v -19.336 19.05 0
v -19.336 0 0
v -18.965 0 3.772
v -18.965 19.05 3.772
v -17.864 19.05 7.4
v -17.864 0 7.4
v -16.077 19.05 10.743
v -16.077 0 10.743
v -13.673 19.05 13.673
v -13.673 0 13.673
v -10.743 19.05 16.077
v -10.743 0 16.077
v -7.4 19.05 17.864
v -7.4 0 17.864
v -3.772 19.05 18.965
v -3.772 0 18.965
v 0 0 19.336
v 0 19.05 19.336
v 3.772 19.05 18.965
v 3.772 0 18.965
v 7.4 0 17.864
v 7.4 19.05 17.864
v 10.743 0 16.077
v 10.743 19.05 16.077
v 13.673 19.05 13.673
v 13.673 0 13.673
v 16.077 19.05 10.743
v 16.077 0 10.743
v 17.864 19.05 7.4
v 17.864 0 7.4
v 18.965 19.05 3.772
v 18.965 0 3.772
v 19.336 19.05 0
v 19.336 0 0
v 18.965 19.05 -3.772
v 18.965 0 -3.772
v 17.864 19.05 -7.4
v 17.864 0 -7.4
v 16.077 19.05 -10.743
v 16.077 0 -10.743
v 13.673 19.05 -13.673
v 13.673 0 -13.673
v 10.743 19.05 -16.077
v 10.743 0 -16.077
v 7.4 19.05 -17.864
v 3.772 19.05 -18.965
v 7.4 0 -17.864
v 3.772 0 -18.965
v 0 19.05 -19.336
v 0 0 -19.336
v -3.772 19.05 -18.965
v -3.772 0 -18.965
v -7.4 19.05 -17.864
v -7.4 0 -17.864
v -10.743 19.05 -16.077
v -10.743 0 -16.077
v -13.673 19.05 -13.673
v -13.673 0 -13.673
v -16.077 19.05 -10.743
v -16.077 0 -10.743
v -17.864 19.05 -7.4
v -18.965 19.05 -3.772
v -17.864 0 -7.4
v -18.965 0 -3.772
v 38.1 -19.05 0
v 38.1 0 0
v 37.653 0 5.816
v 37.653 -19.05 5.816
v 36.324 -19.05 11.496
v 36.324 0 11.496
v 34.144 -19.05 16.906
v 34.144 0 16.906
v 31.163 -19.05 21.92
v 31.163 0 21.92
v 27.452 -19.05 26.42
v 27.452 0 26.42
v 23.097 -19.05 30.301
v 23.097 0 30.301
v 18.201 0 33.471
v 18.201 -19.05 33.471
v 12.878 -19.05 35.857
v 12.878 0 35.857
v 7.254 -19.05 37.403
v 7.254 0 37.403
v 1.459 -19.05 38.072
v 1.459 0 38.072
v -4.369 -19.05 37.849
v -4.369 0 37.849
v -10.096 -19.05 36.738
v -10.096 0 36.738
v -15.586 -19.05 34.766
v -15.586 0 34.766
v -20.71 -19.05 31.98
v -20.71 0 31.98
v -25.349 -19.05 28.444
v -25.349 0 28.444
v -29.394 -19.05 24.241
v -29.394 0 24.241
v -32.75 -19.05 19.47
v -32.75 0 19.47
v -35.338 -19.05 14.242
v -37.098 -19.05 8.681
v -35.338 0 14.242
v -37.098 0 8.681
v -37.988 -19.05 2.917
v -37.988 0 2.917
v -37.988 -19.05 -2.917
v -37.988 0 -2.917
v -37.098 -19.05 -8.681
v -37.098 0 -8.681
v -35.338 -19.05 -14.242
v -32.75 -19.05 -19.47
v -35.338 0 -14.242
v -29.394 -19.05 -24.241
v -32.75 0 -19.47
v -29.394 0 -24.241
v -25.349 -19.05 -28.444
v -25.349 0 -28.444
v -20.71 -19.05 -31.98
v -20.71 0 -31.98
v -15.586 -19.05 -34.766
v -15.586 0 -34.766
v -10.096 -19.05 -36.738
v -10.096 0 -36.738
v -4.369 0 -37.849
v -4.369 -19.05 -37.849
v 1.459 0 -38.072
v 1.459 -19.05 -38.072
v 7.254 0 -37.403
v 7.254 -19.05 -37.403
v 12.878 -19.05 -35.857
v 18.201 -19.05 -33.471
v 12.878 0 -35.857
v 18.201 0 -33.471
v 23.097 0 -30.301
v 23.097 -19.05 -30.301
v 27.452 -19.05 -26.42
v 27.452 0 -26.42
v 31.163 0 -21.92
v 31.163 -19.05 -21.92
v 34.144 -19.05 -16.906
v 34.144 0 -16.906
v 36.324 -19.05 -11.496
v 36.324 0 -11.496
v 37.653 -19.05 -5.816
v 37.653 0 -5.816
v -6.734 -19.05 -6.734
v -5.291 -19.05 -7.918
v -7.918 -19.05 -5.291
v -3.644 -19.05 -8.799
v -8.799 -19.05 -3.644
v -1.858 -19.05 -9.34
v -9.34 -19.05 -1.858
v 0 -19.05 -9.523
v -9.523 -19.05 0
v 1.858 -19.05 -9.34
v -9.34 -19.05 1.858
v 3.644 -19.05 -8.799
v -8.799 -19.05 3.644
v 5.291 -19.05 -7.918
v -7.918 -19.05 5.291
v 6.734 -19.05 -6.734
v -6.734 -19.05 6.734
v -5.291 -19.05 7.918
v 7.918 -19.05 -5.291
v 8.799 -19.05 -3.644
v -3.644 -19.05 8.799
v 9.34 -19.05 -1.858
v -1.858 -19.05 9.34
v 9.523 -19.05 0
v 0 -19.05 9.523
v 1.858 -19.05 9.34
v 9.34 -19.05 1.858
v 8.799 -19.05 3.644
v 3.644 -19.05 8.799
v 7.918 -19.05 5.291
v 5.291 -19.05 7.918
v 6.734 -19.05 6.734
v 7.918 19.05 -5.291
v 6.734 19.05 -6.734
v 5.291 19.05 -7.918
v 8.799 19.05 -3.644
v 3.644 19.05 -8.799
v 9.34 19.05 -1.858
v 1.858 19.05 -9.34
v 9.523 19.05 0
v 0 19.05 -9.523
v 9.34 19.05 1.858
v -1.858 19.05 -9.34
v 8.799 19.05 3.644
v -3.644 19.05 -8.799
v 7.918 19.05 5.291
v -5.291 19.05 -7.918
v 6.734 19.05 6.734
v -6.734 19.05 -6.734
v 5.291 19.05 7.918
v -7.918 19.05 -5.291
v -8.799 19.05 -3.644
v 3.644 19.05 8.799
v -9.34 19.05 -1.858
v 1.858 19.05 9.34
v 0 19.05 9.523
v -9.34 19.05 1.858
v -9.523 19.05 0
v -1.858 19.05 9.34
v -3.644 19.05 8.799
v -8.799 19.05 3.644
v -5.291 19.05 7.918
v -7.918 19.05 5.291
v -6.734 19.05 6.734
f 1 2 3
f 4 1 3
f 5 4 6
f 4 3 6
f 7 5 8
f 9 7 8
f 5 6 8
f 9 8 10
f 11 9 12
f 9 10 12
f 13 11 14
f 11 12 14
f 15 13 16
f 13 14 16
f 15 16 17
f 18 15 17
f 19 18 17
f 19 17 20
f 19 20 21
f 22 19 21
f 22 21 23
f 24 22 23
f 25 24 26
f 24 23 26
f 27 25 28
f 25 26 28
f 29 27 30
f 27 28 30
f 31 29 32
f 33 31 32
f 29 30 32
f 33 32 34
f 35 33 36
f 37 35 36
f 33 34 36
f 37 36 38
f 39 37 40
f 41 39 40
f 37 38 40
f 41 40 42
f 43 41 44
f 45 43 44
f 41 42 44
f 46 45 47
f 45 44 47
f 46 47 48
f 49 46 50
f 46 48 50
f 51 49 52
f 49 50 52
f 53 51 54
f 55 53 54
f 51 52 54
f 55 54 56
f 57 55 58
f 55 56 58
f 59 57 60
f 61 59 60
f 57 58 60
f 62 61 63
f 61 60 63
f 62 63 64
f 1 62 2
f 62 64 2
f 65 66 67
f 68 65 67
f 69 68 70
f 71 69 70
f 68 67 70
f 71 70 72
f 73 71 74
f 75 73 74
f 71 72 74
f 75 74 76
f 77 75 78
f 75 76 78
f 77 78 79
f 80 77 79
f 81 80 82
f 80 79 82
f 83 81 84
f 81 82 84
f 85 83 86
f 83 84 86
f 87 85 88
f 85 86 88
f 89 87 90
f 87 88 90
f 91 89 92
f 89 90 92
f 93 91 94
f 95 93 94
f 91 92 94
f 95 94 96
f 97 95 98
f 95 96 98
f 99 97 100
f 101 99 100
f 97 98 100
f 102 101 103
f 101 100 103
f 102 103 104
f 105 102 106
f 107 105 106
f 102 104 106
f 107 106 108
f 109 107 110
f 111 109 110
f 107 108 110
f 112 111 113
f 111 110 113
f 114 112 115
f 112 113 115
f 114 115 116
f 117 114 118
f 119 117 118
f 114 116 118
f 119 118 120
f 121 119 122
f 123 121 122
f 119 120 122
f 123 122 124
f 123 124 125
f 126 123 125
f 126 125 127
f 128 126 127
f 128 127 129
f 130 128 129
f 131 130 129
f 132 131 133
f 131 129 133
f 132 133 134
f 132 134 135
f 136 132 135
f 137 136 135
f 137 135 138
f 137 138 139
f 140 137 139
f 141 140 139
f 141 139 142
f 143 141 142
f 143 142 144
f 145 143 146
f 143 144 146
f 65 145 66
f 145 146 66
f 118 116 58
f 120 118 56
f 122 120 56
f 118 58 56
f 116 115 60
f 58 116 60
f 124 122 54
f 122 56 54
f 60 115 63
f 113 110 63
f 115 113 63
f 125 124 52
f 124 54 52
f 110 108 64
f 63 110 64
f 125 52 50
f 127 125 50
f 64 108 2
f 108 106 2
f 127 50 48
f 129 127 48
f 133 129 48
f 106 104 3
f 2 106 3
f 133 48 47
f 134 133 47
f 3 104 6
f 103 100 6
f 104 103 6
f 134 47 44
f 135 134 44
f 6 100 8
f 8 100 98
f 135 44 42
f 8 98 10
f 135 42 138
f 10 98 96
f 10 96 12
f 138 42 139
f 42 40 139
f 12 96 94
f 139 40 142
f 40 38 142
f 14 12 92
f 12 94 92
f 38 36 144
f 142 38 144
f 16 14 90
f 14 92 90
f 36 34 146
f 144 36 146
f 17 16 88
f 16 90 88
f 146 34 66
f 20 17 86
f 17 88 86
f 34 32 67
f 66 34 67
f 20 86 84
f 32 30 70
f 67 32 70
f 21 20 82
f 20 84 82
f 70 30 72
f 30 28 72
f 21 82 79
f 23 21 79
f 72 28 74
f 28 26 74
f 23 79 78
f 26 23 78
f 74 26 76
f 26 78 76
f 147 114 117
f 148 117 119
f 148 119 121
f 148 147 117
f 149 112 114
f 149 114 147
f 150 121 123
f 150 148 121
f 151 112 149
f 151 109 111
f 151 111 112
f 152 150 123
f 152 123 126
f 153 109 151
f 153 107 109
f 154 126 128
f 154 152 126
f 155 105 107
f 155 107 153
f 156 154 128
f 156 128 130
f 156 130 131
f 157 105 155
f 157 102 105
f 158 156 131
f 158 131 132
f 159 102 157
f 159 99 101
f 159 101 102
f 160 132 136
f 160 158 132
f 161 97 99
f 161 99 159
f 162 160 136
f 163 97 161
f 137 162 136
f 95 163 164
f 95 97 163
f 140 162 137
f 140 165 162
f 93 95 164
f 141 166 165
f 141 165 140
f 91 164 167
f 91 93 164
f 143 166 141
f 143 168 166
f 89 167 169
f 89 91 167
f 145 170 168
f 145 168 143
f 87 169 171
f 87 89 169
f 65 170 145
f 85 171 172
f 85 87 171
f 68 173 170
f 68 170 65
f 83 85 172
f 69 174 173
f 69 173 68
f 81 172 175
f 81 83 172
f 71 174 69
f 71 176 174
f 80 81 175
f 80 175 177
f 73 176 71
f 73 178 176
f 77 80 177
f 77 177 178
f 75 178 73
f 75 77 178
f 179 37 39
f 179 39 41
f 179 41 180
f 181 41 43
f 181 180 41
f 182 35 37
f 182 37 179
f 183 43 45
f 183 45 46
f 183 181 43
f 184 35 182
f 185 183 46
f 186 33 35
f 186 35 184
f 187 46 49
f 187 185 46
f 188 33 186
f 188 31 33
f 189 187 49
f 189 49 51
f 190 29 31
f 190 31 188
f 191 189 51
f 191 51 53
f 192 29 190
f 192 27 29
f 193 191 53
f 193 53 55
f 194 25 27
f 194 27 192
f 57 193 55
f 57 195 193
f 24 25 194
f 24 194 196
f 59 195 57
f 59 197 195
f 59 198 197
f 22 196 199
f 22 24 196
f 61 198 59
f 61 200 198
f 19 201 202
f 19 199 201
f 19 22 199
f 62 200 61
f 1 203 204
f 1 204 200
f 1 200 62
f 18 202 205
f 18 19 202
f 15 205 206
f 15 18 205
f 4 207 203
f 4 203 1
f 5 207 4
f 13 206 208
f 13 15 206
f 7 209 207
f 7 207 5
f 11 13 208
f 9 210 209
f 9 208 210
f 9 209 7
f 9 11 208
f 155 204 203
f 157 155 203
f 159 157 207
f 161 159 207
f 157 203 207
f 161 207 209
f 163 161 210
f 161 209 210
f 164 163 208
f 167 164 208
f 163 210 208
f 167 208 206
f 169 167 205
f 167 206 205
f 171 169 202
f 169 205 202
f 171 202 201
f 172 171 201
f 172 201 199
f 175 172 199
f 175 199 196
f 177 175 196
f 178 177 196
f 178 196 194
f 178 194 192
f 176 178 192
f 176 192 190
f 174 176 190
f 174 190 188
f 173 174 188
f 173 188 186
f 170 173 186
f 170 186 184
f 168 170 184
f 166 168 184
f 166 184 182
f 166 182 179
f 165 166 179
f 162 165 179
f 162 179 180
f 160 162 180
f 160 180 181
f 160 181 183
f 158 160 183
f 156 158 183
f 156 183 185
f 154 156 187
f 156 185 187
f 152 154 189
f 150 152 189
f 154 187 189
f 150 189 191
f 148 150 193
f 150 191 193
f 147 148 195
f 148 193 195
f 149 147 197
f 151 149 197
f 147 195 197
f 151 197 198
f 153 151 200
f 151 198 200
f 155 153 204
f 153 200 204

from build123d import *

# Parameters (mm, degrees)
F0_R     = 38.1
F1_DEPTH = 19.05
F2_R     = 19.336038
F3_DEPTH = 19.05
F4_R     = 9.523462
F5_DEPTH = 38.101


with BuildPart() as f1:
    # F0 (on Front) → F1 (new body)
    with BuildSketch(Plane.XZ):
        Circle(F0_R)
    extrude(amount=F1_DEPTH)

    # F2 (on face) → F3 (join)
    with BuildSketch(Plane(origin=(0, 0, 0), x_dir=(-1, 0, 0), z_dir=(0, 1, 0))):
        Circle(F2_R)
    extrude(amount=F3_DEPTH)

    # F4 (on face) → F5 (cut, through all)
    with BuildSketch(Plane(origin=(0, 19.05, 0), x_dir=(-1, 0, 0), z_dir=(0, 1, 0))):
        Circle(F4_R)
    extrude(amount=-F5_DEPTH, mode=Mode.SUBTRACT)


solid = f1.part
